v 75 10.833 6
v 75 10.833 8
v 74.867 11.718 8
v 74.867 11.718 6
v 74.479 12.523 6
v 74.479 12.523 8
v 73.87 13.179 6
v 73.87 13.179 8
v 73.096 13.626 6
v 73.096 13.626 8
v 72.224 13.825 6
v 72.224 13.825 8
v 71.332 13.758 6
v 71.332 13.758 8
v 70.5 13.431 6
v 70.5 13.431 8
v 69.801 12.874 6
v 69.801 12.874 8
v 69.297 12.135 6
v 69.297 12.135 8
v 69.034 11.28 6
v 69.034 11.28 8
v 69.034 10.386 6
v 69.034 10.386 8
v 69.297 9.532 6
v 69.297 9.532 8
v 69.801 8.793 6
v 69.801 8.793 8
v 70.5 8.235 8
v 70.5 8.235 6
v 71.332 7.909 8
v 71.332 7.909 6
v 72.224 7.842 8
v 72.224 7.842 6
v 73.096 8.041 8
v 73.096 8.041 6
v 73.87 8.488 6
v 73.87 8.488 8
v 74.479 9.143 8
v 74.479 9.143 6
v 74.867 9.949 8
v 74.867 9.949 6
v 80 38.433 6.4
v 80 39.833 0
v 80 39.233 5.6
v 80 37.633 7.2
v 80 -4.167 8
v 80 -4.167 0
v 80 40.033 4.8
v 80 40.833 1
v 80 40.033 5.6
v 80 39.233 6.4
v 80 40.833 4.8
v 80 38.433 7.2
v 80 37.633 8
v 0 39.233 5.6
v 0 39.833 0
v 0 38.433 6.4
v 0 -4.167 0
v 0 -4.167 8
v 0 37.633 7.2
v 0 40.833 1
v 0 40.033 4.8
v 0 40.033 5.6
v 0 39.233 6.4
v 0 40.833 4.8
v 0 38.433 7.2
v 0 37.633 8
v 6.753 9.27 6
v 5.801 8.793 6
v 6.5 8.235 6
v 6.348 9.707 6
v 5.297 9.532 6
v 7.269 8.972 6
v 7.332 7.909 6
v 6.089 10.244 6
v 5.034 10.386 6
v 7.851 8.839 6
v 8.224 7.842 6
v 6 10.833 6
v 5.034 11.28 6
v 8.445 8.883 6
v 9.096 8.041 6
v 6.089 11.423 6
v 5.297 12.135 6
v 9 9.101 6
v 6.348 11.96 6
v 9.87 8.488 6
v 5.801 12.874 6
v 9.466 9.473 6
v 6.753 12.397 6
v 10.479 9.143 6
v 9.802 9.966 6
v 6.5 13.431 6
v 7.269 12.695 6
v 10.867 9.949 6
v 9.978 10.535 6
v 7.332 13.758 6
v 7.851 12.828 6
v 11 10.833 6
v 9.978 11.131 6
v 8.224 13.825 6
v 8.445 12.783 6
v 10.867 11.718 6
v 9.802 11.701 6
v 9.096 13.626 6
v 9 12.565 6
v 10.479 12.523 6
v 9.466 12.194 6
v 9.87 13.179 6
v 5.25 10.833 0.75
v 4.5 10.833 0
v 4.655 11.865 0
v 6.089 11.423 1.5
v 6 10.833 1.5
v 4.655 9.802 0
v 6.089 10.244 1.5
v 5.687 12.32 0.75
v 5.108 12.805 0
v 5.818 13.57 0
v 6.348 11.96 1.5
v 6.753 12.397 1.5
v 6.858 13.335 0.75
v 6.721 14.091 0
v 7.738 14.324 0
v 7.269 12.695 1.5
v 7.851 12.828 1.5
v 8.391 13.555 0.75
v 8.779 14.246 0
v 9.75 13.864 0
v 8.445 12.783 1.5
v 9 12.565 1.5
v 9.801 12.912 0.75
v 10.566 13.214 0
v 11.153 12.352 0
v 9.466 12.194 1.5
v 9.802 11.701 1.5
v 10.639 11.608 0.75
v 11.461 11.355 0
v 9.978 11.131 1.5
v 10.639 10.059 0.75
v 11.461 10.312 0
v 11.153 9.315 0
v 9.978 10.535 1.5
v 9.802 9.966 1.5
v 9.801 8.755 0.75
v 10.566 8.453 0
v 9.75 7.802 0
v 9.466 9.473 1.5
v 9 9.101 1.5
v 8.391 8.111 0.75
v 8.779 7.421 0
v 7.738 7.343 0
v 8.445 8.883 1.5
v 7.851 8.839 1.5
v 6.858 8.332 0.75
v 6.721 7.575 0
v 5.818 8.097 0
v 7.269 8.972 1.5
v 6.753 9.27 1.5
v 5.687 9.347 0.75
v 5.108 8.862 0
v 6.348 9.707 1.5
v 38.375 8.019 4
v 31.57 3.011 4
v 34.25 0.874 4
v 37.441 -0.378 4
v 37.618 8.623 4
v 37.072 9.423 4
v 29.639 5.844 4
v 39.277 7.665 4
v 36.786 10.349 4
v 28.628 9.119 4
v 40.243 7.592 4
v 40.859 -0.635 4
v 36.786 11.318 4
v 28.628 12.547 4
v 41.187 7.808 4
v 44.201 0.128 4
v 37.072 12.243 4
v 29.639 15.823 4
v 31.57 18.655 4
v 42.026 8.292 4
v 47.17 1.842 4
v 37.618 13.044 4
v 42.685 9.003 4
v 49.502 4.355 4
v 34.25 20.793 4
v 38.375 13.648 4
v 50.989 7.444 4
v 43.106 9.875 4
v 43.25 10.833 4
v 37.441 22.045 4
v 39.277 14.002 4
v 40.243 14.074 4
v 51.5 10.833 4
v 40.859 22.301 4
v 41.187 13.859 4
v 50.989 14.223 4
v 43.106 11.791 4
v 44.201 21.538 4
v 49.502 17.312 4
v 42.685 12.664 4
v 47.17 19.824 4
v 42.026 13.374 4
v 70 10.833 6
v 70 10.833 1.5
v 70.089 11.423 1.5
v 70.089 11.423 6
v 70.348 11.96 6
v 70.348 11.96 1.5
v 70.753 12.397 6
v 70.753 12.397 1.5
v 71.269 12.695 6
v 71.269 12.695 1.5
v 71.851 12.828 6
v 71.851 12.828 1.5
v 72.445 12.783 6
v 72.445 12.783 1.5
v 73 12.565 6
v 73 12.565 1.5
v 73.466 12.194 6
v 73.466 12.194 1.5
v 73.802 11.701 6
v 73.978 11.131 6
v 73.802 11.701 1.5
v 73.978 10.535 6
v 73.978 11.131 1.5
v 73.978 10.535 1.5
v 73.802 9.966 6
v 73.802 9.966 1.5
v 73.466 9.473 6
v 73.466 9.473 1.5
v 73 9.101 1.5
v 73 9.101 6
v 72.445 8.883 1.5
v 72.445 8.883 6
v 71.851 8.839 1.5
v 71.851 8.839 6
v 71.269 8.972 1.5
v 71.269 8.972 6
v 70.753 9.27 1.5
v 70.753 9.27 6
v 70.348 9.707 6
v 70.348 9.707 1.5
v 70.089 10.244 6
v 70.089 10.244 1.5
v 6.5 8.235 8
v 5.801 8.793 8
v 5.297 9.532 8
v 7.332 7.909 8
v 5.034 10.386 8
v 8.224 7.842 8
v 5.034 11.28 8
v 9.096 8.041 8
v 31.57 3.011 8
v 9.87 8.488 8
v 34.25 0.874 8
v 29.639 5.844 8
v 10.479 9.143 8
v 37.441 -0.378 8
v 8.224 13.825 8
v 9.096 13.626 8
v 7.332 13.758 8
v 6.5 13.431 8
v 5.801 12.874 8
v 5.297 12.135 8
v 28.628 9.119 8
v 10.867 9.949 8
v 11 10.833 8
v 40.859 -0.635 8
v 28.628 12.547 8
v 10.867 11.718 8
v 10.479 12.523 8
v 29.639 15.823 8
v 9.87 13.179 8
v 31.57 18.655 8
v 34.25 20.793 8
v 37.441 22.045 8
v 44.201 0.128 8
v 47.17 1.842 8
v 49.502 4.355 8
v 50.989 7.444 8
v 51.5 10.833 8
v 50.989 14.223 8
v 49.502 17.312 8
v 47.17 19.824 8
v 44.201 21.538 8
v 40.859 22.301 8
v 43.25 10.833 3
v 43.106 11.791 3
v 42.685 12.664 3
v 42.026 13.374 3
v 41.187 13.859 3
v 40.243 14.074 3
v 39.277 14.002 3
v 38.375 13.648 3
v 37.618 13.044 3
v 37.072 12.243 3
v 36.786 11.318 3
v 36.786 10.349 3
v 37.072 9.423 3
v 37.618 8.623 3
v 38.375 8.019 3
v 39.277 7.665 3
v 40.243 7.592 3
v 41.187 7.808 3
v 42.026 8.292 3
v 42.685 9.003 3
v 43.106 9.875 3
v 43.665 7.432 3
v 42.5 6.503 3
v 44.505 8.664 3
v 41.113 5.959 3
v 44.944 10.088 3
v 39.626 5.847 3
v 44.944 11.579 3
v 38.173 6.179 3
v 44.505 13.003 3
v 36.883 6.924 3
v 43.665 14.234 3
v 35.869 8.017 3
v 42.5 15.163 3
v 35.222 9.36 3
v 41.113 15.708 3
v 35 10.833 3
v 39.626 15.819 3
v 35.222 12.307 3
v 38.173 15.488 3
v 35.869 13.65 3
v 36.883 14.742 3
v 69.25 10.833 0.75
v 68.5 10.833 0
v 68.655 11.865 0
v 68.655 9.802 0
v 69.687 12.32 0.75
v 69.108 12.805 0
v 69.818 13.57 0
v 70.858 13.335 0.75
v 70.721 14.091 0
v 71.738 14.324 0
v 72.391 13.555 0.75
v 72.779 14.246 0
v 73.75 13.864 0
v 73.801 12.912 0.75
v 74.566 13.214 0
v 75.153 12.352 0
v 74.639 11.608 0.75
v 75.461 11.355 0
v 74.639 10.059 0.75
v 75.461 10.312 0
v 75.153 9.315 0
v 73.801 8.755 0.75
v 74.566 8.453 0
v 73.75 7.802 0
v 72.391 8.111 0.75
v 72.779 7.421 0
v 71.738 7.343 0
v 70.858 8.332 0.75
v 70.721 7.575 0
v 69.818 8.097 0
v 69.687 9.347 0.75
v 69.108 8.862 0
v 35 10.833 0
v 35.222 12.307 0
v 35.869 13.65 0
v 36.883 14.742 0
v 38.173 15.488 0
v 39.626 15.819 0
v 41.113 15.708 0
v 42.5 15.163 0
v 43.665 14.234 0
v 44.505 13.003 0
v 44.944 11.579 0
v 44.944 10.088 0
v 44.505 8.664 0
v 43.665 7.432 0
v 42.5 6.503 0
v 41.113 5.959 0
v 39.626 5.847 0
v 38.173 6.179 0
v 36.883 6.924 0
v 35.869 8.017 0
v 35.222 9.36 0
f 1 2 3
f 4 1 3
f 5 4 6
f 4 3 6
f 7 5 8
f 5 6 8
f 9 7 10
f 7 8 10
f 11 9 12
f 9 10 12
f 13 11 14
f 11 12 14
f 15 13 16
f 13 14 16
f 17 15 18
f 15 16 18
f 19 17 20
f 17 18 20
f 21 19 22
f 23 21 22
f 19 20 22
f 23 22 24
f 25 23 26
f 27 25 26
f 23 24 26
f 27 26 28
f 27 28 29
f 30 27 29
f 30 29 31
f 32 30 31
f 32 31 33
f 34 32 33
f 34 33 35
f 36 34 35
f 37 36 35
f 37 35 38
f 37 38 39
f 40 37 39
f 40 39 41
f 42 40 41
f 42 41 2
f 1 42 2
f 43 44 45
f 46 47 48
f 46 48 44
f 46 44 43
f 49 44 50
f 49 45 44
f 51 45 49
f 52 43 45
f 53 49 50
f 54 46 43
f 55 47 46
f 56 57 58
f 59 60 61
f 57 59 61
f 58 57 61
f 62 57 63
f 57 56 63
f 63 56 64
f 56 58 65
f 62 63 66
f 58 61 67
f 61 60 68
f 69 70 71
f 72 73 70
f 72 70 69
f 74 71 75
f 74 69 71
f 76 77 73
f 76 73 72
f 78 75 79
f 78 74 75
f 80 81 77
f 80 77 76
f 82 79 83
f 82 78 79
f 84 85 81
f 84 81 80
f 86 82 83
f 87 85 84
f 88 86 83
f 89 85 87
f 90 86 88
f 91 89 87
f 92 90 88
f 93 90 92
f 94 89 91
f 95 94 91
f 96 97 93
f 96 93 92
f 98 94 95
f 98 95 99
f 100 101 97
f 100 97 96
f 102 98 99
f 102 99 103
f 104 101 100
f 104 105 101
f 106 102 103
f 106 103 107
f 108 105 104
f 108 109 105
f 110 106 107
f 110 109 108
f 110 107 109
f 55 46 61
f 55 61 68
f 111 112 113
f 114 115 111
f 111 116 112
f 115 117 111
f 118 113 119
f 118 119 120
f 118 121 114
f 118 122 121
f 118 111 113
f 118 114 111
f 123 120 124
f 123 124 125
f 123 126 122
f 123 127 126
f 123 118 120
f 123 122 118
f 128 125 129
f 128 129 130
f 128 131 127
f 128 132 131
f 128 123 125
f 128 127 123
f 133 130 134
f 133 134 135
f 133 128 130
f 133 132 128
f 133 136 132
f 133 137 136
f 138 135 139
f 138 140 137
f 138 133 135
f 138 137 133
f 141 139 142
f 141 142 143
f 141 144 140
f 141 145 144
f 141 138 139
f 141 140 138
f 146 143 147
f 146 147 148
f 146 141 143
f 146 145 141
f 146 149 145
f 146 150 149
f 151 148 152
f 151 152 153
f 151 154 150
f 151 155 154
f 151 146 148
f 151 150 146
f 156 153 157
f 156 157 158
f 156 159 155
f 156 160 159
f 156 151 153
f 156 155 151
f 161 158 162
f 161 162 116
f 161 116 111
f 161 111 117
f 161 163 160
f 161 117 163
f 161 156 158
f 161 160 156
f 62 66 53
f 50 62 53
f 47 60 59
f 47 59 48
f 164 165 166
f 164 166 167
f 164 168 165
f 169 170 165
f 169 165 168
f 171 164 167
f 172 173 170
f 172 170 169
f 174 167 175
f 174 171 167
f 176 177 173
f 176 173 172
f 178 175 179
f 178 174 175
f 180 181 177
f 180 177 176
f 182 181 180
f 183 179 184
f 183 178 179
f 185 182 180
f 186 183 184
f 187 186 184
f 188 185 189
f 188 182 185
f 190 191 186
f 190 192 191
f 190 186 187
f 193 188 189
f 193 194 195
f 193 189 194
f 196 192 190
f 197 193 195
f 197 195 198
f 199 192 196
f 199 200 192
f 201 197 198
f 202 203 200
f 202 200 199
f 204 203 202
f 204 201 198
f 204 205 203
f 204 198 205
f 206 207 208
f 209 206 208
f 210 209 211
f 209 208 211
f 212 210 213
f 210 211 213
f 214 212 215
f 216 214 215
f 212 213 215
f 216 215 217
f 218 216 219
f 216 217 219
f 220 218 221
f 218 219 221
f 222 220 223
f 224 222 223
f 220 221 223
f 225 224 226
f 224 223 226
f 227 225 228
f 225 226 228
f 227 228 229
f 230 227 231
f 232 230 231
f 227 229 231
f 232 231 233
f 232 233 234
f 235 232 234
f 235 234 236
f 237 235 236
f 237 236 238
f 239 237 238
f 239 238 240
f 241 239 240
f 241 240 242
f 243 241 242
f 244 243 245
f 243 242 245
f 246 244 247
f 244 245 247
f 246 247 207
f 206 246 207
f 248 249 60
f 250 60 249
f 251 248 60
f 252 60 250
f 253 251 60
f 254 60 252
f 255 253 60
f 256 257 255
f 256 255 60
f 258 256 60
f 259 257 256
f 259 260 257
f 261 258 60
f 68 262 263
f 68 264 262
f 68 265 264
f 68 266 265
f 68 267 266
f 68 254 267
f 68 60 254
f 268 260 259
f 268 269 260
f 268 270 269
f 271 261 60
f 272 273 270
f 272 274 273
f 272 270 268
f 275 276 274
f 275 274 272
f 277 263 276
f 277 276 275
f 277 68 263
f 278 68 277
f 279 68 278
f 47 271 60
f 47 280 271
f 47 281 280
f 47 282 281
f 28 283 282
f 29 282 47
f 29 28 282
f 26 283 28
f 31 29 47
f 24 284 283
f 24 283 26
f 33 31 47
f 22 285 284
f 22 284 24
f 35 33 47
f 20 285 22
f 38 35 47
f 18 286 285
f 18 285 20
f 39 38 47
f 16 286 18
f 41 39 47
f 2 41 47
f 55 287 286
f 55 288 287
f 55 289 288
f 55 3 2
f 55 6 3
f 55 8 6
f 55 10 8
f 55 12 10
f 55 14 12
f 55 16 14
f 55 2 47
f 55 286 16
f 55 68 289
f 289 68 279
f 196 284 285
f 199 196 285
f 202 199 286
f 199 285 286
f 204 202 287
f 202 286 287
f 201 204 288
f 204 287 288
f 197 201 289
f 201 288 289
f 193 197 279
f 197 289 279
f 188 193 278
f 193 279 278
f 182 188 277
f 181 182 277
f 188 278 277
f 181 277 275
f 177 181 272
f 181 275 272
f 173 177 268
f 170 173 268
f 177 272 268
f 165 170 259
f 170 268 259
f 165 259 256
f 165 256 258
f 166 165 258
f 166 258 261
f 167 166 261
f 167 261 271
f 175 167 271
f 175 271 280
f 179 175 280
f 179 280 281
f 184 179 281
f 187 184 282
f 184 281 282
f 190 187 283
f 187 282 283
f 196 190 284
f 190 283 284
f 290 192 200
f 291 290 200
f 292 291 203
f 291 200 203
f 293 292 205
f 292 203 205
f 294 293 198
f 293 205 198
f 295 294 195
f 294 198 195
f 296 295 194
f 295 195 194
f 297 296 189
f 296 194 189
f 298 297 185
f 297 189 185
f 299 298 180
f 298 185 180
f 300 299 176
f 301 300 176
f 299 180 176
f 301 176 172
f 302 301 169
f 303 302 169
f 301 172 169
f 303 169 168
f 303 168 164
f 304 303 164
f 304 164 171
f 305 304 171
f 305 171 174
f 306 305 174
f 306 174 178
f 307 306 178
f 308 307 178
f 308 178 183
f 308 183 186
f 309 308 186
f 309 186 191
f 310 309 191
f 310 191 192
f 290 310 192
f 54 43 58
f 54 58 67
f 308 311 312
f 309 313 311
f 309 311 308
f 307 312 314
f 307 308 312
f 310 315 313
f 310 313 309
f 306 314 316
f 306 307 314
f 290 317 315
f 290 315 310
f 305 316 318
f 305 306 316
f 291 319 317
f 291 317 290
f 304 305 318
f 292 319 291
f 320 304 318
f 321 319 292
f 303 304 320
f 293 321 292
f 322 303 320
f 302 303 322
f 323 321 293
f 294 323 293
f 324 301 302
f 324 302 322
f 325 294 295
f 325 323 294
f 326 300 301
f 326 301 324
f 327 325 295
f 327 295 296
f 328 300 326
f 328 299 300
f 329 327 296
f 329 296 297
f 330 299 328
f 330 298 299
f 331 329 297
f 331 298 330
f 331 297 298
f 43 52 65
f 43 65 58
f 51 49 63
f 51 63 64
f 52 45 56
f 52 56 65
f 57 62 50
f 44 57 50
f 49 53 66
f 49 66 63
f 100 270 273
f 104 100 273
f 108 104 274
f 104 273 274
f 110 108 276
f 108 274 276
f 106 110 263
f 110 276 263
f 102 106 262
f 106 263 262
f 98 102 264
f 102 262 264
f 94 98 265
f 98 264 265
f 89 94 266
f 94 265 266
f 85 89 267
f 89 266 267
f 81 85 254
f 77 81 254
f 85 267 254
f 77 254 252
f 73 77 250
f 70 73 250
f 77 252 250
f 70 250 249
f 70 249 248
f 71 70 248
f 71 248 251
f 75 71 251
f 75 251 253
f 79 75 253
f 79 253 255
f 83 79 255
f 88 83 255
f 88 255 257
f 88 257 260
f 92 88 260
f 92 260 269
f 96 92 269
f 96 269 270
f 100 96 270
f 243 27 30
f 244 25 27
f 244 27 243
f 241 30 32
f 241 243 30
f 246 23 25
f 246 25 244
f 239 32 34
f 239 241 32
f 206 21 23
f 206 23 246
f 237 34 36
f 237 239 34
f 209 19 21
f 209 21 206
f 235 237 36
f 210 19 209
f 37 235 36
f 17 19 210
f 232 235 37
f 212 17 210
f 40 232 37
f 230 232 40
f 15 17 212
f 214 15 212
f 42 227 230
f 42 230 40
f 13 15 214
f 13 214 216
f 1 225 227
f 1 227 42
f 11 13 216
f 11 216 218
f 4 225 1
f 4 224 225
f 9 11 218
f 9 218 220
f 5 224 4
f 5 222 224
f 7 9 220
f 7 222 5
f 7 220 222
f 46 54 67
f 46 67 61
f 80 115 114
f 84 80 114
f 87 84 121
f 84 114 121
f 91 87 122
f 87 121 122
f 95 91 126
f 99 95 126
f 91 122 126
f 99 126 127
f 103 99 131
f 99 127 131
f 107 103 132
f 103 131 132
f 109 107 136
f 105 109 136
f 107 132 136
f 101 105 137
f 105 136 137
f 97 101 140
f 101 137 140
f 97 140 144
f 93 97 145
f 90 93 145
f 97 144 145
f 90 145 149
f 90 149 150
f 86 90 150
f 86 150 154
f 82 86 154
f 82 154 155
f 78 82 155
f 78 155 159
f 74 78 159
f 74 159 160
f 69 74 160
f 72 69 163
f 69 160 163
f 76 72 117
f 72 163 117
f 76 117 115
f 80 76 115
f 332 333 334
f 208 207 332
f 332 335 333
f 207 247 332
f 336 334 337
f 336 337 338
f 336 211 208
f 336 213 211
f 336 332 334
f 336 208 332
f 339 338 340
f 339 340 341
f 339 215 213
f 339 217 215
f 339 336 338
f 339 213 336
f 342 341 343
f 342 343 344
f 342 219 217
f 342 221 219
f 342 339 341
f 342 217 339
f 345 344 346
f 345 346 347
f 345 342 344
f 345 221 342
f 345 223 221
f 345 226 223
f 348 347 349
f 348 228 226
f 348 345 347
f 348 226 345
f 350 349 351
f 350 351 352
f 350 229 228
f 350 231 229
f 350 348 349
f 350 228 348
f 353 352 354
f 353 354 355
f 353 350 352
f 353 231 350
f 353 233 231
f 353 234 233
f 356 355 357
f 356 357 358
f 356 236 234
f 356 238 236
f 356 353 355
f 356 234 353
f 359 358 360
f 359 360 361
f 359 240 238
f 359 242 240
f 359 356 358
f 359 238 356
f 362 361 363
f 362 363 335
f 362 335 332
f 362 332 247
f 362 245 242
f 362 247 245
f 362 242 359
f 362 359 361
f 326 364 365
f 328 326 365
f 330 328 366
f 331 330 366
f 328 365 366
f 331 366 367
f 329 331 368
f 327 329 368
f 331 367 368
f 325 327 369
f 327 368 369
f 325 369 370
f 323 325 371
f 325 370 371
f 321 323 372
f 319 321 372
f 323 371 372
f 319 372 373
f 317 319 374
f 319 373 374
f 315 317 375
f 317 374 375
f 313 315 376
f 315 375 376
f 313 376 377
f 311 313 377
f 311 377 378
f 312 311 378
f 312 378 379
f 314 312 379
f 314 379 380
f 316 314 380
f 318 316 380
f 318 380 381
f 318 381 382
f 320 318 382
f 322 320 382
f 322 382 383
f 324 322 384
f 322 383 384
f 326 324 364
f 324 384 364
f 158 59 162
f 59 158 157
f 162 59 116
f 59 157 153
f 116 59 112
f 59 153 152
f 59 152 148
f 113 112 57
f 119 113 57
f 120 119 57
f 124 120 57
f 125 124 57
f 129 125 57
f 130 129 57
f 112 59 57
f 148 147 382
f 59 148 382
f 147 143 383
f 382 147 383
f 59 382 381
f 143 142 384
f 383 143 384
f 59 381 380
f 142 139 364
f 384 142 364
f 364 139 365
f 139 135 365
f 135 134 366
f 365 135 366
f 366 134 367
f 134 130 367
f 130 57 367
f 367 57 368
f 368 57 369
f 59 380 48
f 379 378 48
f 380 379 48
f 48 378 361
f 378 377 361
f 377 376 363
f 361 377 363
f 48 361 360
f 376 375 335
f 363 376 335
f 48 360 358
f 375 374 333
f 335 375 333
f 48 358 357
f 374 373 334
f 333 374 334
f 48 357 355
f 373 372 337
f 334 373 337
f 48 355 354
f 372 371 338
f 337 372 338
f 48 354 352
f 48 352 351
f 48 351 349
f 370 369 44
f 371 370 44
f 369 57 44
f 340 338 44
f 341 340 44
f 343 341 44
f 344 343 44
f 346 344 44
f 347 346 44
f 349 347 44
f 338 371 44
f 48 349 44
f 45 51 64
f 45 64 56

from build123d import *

# Parameters (mm, degrees)
SKETCH_1_W                     = 80
SKETCH_1_H                     = 60
EXTRUDE_1_DEPTH                = 8
HOLE_WIZARD_M3_5_1_D           = 4
HOLE_WIZARD_M3_5_1_CBORE_D     = 6
HOLE_WIZARD_M3_5_1_CBORE_DEPTH = 2
SKETCH_14_W                    = 80
SKETCH_14_H                    = 2
SKETCH_14_W_2                  = 2
SKETCH_14_H_2                  = 16
CUT_EXTRUDE_1_DEPTH            = 1
CUT_EXTRUDE_2_REACH            = 92.174
SKETCH_15_R                    = 3.25
SKETCH_17_R                    = 11.5
CUT_EXTRUDE_4_DEPTH            = 4
SKETCH_18_R                    = 5
CUT_EXTRUDE_5_DEPTH            = 3
CHAMFER_1_SIZE                 = 1.499999999
CHAMFER_1_SIZE2                = 1.500000001
CHAMFER_2_SIZE                 = 1
SKETCH_20_W                    = 80
SKETCH_20_H                    = 6
CUT_EXTRUDE_6_DEPTH            = 1
SKETCH_21_W                    = 80
SKETCH_21_H                    = 4
CUT_EXTRUDE_7_DEPTH            = 1
SKETCH_22_W                    = 80
SKETCH_22_H                    = 2
CUT_EXTRUDE_8_DEPTH            = 1
SKETCH_23_R                    = 1
CUT_EXTRUDE_9_DEPTH            = 1
CUT_EXTRUDE_10_REACH           = 92.174
SKETCH_24_W                    = 80
SKETCH_24_H                    = 15
SKETCH_25_W                    = 80
SKETCH_25_H                    = 18
EXTRUDE_2_DEPTH                = 3
CUT_EXTRUDE_11_REACH           = 92.174


with BuildPart() as part:
    # 草图1 → 凸台-拉伸1 (new body)
    with BuildSketch(Plane.XY.offset(8)):
        with Locations((40, 10.833333333)):
            Rectangle(SKETCH_1_W, SKETCH_1_H)
    extrude(amount=-EXTRUDE_1_DEPTH)

    # M3.5 六角头机械螺钉的柱形沉头孔1 (through all)
    with Locations(Plane.XY.offset(8)):
        with Locations((8, 10.833333333), (72, 10.833333333)):
            CounterBoreHole(HOLE_WIZARD_M3_5_1_D / 2, HOLE_WIZARD_M3_5_1_CBORE_D / 2, HOLE_WIZARD_M3_5_1_CBORE_DEPTH)

    # 草图14 → 切除-拉伸1 (cut)
    with BuildSketch(Plane.XY.offset(8)):
        with Locations((40, 37.833333333)):
            Rectangle(SKETCH_14_W, SKETCH_14_H)
        Polygon((15, 40.833333333), (31, 24.833333333), (32.414213562, 26.247546896), (16.414213562, 42.247546896), align=None)
        with Locations((7, 32.833333333)):
            Rectangle(SKETCH_14_W_2, SKETCH_14_H_2)
        with Locations((40, 32.833333333)):
            Rectangle(SKETCH_14_W_2, SKETCH_14_H_2)
        with Locations((73, 32.833333333)):
            Rectangle(SKETCH_14_W_2, SKETCH_14_H_2)
        Polygon((47.585786438, 26.247546896), (63.585786438, 42.247546896), (65, 40.833333333), (49, 24.833333333), align=None)
    extrude(amount=-CUT_EXTRUDE_1_DEPTH, mode=Mode.SUBTRACT)

    # 草图15 → 切除-拉伸2 (cut, up to next)
    with BuildSketch(Plane.XY.offset(8), mode=Mode.PRIVATE) as cut_extrude_2_sk1:
        with Locations((40, 10.833333333)):
            Circle(SKETCH_15_R)
    cut_extrude_2_tool1 = extrude(cut_extrude_2_sk1.sketch, amount=-CUT_EXTRUDE_2_REACH, mode=Mode.PRIVATE) & part.part
    add(cut_extrude_2_tool1.solids().sort_by_distance((40, 10.833333, 8))[0], mode=Mode.SUBTRACT)

    # 草图17 → 切除-拉伸4 (cut)
    with BuildSketch(Plane.XY.offset(8)):
        with Locations((40, 10.833333333)):
            Circle(SKETCH_17_R)
    extrude(amount=-CUT_EXTRUDE_4_DEPTH, mode=Mode.SUBTRACT)

    # 草图18 → 切除-拉伸5 (cut)
    with BuildSketch(Plane(origin=(0, 0, 0), x_dir=(-1, 0, 0), z_dir=(0, 0, -1))):
        with Locations((-40, 10.833333333)):
            Circle(SKETCH_18_R)
    extrude(amount=-CUT_EXTRUDE_5_DEPTH, mode=Mode.SUBTRACT)

    # 倒角1
    chamfer_1_edges = [part.edges().sort_by_distance(p)[0] for p in [
        (74, 10.833333333, 0),
        (10, 10.833333333, 0),
    ]]
    chamfer_1_side = [part.faces().sort_by_distance(p)[0] for p in [
        (79, 10.833333333, 0),
    ]]
    chamfer(chamfer_1_edges, length=CHAMFER_1_SIZE, length2=CHAMFER_1_SIZE2, reference=chamfer_1_side[0])

    # 倒角2
    chamfer_2_edges = [part.edges().sort_by_distance(p)[0] for p in [
        (40, 40.833333333, 0),
    ]]
    chamfer(chamfer_2_edges, length=CHAMFER_2_SIZE)

    # 草图20 → 切除-拉伸6 (cut)
    with BuildSketch(Plane.XY.offset(8)):
        with Locations((40, -16.166666667)):
            Rectangle(SKETCH_20_W, SKETCH_20_H)
    extrude(amount=-CUT_EXTRUDE_6_DEPTH, mode=Mode.SUBTRACT)

    # 草图21 → 切除-拉伸7 (cut)
    with BuildSketch(Plane.XY.offset(7)):
        with Locations((40, -17.166666667)):
            Rectangle(SKETCH_21_W, SKETCH_21_H)
    extrude(amount=-CUT_EXTRUDE_7_DEPTH, mode=Mode.SUBTRACT)

    # 草图22 → 切除-拉伸8 (cut)
    with BuildSketch(Plane.XY.offset(6)):
        with Locations((40, -18.166666667)):
            Rectangle(SKETCH_22_W, SKETCH_22_H)
    extrude(amount=-CUT_EXTRUDE_8_DEPTH, mode=Mode.SUBTRACT)

    # 草图23 → 切除-拉伸9 (cut)
    with BuildSketch(Plane.XY.offset(8)):
        with Locations((7, 24.833333333)):
            Circle(SKETCH_23_R)
        with Locations((31.707106781, 25.540440115)):
            Circle(SKETCH_23_R)
        with Locations((40, 24.833333333)):
            Circle(SKETCH_23_R)
        with Locations((48.292893219, 25.540440115)):
            Circle(SKETCH_23_R)
        with Locations((73, 24.833333333)):
            Circle(SKETCH_23_R)
    extrude(amount=-CUT_EXTRUDE_9_DEPTH, mode=Mode.SUBTRACT)

    # 草图24 → 切除-拉伸10 (cut, up to next)
    with BuildSketch(Plane.XY.offset(8), mode=Mode.PRIVATE) as cut_extrude_10_sk1:
        with Locations((40, -11.666666667)):
            Rectangle(SKETCH_24_W, SKETCH_24_H)
    cut_extrude_10_tool1 = extrude(cut_extrude_10_sk1.sketch, amount=-CUT_EXTRUDE_10_REACH, mode=Mode.PRIVATE) & part.part
    add(cut_extrude_10_tool1.solids().sort_by_distance((40, -11.666667, 8))[0], mode=Mode.SUBTRACT)

    # 草图25 → 凸台-拉伸2 (add)
    with BuildSketch(Plane.XY.offset(8)):
        with Locations((40, 31.833333333)):
            Rectangle(SKETCH_25_W, SKETCH_25_H)
    extrude(amount=-EXTRUDE_2_DEPTH)

    # 草图26 → 切除-拉伸11 (cut, up to next)
    with BuildSketch(Plane.ZY, mode=Mode.PRIVATE) as cut_extrude_11_sk1:
        Polygon((4.8, 40.833333333), (4.8, 40.033333333), (5.6, 40.033333333), (5.6, 39.233333333), (6.4, 39.233333333), (6.4, 38.433333333), (7.2, 38.433333333), (7.2, 37.633333333), (8, 37.633333333), (8, 40.833333333), align=None)
    cut_extrude_11_tool1 = extrude(cut_extrude_11_sk1.sketch, amount=-CUT_EXTRUDE_11_REACH, mode=Mode.PRIVATE) & part.part
    add(cut_extrude_11_tool1.solids().sort_by_distance((0, 39.633333, 6.8))[0], mode=Mode.SUBTRACT)


solid = part.part
